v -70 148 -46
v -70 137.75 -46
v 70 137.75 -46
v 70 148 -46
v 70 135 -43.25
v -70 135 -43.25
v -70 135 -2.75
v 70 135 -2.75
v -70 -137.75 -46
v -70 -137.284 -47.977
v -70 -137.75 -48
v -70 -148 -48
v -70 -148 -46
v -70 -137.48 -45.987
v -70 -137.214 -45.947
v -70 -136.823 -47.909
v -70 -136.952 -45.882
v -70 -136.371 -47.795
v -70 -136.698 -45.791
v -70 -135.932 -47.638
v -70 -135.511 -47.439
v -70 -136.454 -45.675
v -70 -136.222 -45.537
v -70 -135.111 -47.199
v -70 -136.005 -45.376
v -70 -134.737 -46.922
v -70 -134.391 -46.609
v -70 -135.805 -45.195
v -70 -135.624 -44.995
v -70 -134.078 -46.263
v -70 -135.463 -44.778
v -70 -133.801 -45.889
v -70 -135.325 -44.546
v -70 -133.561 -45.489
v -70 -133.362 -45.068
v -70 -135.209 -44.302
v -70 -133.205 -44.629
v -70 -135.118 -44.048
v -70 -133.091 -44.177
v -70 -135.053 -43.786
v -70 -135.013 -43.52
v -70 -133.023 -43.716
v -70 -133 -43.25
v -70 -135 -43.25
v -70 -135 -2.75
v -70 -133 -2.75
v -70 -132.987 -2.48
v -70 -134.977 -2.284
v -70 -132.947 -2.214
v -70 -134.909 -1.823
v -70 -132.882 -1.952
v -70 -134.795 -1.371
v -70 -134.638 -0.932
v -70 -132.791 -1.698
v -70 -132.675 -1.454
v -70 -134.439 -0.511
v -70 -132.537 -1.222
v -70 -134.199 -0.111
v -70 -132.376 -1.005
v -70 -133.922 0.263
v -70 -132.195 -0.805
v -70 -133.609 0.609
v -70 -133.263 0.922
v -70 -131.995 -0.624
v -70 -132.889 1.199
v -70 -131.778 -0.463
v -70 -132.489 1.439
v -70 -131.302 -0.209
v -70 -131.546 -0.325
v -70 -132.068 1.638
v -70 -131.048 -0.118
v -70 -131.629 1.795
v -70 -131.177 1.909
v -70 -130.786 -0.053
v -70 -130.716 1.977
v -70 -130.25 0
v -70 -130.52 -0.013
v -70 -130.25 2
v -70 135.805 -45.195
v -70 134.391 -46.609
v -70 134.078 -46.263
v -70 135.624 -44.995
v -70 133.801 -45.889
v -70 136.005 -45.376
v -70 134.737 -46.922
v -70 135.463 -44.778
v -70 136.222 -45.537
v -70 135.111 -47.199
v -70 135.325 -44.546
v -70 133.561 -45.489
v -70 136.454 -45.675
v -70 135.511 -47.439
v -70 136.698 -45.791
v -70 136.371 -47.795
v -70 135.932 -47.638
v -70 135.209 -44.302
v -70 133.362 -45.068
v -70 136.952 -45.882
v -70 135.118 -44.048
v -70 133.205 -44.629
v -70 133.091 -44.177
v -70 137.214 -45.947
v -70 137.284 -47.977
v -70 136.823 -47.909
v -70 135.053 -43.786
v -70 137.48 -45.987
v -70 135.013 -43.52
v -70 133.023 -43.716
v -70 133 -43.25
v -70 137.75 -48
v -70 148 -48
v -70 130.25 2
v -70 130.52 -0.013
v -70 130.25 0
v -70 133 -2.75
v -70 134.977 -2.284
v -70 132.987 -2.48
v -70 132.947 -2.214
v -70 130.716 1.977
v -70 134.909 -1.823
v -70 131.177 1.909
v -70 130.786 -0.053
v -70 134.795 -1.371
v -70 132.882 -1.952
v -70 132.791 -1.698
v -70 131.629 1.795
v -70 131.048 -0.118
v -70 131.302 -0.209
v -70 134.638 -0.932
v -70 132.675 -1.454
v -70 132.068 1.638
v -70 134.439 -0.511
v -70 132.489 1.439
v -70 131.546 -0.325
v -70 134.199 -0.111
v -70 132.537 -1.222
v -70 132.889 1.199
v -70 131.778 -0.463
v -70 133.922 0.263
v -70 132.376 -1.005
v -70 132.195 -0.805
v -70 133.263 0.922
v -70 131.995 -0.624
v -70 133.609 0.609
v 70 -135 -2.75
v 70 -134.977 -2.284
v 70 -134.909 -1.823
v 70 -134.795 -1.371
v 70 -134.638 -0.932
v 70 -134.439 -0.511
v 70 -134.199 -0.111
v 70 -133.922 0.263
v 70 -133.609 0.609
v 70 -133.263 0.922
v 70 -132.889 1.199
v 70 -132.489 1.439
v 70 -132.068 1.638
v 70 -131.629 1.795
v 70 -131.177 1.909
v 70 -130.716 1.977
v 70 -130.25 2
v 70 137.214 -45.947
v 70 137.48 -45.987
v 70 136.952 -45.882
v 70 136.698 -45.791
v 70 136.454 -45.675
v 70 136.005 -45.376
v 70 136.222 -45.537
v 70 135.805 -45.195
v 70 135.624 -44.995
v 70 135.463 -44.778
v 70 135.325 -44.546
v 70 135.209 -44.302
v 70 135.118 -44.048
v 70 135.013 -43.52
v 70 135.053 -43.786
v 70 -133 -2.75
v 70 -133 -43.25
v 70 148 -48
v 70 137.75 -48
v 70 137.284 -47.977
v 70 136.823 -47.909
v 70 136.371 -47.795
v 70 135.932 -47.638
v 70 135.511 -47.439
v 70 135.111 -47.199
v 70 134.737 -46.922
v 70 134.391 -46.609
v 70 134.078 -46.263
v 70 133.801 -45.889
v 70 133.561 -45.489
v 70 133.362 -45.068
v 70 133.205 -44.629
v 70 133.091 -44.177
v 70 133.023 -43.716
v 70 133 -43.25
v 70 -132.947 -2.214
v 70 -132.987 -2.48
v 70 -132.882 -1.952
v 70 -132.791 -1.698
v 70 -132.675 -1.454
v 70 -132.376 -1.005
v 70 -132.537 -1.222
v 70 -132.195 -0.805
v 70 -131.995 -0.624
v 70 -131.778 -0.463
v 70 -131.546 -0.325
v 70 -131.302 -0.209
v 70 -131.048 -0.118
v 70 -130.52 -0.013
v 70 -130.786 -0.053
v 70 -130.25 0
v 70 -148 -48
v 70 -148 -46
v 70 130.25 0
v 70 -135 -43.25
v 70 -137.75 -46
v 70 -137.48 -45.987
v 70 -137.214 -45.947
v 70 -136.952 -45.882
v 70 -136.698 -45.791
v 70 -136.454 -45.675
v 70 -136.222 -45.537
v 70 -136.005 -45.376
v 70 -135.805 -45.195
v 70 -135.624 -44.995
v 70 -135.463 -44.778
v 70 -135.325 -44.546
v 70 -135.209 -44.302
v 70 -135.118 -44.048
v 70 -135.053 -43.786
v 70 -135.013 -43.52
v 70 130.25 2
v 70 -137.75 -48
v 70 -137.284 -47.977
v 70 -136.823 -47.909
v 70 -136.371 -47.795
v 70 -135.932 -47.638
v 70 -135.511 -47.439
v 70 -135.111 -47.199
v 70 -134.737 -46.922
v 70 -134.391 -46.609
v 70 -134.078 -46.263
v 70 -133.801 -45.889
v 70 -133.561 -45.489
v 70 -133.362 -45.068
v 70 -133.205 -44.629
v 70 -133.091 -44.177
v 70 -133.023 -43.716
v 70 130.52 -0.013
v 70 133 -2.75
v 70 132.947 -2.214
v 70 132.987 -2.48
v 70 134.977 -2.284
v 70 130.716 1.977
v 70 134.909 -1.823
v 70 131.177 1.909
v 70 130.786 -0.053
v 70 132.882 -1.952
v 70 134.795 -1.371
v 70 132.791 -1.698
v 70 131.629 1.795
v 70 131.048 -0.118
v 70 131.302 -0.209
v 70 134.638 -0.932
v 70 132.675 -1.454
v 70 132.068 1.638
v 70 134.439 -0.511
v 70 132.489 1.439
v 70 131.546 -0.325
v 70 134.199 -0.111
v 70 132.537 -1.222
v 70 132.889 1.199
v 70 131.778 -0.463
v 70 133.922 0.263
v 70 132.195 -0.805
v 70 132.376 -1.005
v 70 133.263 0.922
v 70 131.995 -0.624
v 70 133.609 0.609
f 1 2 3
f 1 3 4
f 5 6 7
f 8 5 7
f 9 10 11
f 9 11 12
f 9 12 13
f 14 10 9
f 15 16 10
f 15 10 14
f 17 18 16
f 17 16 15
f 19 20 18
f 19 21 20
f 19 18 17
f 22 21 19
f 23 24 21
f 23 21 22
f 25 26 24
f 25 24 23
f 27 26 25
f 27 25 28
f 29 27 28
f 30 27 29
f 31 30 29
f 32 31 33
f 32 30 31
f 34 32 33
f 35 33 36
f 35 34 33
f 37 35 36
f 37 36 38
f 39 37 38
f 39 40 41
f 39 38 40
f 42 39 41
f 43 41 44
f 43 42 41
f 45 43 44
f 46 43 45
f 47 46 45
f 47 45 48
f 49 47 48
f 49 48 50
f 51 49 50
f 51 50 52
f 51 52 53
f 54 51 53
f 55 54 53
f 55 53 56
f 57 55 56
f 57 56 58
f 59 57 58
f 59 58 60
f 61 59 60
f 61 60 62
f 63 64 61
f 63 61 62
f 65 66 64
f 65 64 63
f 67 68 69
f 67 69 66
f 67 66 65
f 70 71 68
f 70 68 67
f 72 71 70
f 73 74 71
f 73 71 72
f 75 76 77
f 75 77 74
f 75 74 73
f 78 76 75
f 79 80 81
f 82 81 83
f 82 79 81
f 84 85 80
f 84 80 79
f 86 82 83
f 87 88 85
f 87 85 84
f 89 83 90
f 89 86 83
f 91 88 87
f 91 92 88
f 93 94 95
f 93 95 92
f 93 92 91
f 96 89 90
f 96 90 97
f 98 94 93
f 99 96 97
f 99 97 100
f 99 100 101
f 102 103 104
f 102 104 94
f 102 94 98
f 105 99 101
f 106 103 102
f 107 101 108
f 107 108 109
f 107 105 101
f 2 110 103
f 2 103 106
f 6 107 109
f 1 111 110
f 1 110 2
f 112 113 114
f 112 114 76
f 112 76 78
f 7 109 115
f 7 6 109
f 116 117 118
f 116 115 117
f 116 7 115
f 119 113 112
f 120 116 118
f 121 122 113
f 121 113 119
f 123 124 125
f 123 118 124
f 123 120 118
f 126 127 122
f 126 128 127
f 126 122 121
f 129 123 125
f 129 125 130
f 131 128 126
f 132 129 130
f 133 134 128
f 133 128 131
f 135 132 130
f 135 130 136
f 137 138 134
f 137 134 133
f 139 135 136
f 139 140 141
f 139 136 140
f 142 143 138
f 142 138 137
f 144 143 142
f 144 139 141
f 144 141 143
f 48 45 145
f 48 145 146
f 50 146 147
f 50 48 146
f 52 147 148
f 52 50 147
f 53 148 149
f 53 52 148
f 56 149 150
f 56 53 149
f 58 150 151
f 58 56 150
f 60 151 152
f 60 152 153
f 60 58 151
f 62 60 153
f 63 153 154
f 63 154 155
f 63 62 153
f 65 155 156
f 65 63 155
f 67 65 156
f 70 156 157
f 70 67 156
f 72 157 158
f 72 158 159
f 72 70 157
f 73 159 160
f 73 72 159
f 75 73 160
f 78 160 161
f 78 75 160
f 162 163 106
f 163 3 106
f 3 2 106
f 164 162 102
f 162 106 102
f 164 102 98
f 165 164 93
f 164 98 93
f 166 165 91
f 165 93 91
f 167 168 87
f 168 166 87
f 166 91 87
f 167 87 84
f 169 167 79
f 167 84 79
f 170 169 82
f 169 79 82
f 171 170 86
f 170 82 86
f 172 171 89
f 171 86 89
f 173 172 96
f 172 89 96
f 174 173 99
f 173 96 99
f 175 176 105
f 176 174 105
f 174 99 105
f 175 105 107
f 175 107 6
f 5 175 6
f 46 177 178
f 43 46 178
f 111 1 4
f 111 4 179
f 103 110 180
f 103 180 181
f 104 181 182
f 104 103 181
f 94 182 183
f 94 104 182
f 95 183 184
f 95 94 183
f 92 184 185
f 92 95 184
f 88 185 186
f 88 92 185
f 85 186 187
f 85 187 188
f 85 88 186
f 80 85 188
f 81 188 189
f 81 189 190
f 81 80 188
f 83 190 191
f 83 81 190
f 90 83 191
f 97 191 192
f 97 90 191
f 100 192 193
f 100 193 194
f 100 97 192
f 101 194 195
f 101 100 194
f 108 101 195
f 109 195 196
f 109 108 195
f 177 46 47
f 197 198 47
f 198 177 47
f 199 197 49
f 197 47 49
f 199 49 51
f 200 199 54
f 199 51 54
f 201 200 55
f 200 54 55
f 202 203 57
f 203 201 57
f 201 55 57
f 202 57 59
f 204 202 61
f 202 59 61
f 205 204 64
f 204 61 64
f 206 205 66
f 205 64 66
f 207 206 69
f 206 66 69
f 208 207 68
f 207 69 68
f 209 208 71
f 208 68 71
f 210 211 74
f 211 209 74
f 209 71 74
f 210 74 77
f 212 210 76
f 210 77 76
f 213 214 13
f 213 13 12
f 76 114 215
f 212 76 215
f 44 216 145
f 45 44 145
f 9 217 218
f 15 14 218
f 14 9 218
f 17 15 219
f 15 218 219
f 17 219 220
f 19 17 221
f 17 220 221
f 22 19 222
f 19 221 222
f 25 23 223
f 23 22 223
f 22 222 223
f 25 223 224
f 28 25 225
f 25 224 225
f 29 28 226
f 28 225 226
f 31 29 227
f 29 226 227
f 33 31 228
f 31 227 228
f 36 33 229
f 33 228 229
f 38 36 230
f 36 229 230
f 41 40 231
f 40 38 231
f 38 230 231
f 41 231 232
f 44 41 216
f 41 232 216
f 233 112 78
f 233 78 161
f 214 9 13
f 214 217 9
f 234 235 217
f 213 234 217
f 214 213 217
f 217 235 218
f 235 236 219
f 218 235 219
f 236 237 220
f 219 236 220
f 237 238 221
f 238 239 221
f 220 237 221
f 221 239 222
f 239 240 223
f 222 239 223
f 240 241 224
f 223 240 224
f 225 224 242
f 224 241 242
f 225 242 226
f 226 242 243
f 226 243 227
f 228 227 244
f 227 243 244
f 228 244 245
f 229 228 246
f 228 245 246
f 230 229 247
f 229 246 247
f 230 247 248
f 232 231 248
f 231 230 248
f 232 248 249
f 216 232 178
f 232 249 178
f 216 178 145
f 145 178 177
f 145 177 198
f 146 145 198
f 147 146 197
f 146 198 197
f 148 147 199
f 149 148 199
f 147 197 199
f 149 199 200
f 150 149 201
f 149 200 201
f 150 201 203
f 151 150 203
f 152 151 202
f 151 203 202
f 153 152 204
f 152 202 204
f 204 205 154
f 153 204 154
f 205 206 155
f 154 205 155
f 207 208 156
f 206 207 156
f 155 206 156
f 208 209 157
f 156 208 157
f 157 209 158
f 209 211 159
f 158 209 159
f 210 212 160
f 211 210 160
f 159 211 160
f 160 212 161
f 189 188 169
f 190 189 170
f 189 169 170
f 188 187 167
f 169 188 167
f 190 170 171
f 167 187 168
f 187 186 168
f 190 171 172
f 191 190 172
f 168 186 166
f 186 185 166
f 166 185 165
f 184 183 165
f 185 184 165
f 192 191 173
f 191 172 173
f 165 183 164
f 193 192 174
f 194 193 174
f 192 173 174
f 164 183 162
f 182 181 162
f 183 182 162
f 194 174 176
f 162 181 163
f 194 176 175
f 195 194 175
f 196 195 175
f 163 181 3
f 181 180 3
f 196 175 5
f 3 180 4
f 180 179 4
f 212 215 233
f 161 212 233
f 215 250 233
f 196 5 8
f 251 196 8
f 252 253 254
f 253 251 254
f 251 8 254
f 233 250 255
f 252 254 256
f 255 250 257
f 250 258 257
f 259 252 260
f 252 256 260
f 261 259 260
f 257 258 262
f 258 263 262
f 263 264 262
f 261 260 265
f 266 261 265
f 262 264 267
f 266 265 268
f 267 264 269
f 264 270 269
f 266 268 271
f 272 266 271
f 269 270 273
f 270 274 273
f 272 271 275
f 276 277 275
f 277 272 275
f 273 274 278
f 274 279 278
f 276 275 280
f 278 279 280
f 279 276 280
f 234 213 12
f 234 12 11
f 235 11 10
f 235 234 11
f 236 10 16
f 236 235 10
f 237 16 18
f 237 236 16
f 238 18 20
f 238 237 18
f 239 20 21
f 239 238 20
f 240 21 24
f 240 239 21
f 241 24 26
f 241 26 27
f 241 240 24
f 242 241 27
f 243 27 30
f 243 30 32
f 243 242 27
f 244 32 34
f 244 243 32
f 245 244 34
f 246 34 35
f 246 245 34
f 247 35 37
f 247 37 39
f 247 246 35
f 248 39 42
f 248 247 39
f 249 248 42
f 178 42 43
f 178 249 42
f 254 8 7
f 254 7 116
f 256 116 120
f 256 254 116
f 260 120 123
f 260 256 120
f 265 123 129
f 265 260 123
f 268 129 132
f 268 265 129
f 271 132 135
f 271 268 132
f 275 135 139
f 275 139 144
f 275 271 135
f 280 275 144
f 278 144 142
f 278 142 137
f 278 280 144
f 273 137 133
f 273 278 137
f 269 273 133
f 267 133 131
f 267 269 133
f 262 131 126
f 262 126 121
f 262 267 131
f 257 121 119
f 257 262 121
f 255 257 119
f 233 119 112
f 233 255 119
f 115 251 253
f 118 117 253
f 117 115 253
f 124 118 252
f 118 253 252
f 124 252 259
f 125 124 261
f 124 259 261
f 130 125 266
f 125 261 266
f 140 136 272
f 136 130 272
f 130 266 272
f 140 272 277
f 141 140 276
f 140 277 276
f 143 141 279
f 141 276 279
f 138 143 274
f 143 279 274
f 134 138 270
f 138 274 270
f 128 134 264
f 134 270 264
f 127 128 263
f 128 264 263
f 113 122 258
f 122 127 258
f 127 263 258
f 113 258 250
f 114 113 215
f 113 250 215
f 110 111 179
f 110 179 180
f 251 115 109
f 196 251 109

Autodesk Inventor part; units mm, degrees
ref_plane "YZ Plane" through (0, 0, 0) normal (1, 0, 0) x (0, 1, 0)
ref_plane "XZ Plane" through (0, 0, 0) normal (0, 1, 0) x (-1, 0, 0)
ref_plane "XY Plane" through (0, 0, 0) normal (0, 0, 1) x (1, 0, 0)
sketch "Sketch1" plane through (0, 0, 0) normal (0, 0, 1) x (1, 0, 0)
  line L0 (-70, -135) -> (70, -135)
  line L1 (70, -135) -> (70, 135)
  line L2 (70, 135) -> (-70, 135)
  line L3 (-70, 135) -> (-70, -135)
  line L4 (-70, -135) -> (70, 135) construction
  line L5 (70, -135) -> (-70, 135) construction
  point P0 (0, 0)
  dimension "d0" = 140
  dimension "d1" = 270
extrude "Plate1" add sketch "Sketch1" along normal blind 2
sketch "Sketch3" plane through (70, 133, 2) normal (0, 1, 0) x (-1, 0, 0)
  line L0 (140, 0) -> (0, 0)
  line L1 (0, 0) -> (0, -50)
  line L2 (0, -50) -> (140, -50)
  line L3 (140, -50) -> (140, 0)
edge flange "Flange1" height 50 angle 90 thickness 2 bend radius 2.75 thickness toward (0, 1, 0) relief round relief width 2 relief depth 1 corner gap 2.75 corner form 0 edges at (0, 135, 0) (0, -135, 0) wall of the first edge with corners at (-70, 133, 2) (70, 133, 2) (70, 133, -48) (-70, 133, -48)
bend "Bend1"
corner "Corner1"
sketch "Sketch4" plane through (-70, 133, -46) normal (0, 0, -1) x (-1, 0, 0)
  line L0 (-140, 0) -> (0, 0)
  line L1 (0, 0) -> (0, 15)
  line L2 (0, 15) -> (-140, 15)
  line L3 (-140, 15) -> (-140, 0)
edge flange "Flange2" height 15 angle 90 thickness 2 bend radius 2.75 thickness toward (0, 0, -1) relief round relief width 2 relief depth 1 corner gap 2.75 corner form 0 edges at (0, 135, -48) (0, -135, -48) wall of the first edge with corners at (70, 133, -46) (-70, 133, -46) (-70, 148, -46) (70, 148, -46)
bend "Bend2"
corner "Corner2"
equation "\"d2\" = Thickness"
equation "\"d6\" = BendReliefWidth"
equation "\"d7\" = BendReliefDepth"
equation "\"d8\" = MinimumRemnant"
equation "\"d9\" = TransitionRadius"
equation "\"d12\" = BendRadius"
equation "\"d13\" = CornerReliefSize"
equation "\"d14\" = GapSize"
equation "\"d15\" = JacobiRadiusSize"
equation "\"d16\" = BendReliefWidth"
equation "\"d17\" = BendReliefDepth"
equation "\"d18\" = MinimumRemnant"
equation "\"d19\" = TransitionRadius"
equation "\"d22\" = BendRadius"
equation "\"d23\" = CornerReliefSize"
equation "\"d24\" = GapSize"
equation "\"d25\" = JacobiRadiusSize"
equation "\"BendReliefWidth\" = Thickness"
equation "\"BendReliefDepth\" = 0.5 * Thickness"
equation "\"CornerReliefSize\" = 4 * Thickness"
equation "\"MinimumRemnant\" = 2 * Thickness"
equation "\"TransitionRadius\" = BendRadius"
equation "\"JacobiRadiusSize\" = BendRadius"
equation "\"GapSize\" = Thickness"
equation "\"Thickness\" = 2"
equation "\"BendRadius\" = 2.75"
properties part number "BSH pollar 5" material "Stainless Steel"
